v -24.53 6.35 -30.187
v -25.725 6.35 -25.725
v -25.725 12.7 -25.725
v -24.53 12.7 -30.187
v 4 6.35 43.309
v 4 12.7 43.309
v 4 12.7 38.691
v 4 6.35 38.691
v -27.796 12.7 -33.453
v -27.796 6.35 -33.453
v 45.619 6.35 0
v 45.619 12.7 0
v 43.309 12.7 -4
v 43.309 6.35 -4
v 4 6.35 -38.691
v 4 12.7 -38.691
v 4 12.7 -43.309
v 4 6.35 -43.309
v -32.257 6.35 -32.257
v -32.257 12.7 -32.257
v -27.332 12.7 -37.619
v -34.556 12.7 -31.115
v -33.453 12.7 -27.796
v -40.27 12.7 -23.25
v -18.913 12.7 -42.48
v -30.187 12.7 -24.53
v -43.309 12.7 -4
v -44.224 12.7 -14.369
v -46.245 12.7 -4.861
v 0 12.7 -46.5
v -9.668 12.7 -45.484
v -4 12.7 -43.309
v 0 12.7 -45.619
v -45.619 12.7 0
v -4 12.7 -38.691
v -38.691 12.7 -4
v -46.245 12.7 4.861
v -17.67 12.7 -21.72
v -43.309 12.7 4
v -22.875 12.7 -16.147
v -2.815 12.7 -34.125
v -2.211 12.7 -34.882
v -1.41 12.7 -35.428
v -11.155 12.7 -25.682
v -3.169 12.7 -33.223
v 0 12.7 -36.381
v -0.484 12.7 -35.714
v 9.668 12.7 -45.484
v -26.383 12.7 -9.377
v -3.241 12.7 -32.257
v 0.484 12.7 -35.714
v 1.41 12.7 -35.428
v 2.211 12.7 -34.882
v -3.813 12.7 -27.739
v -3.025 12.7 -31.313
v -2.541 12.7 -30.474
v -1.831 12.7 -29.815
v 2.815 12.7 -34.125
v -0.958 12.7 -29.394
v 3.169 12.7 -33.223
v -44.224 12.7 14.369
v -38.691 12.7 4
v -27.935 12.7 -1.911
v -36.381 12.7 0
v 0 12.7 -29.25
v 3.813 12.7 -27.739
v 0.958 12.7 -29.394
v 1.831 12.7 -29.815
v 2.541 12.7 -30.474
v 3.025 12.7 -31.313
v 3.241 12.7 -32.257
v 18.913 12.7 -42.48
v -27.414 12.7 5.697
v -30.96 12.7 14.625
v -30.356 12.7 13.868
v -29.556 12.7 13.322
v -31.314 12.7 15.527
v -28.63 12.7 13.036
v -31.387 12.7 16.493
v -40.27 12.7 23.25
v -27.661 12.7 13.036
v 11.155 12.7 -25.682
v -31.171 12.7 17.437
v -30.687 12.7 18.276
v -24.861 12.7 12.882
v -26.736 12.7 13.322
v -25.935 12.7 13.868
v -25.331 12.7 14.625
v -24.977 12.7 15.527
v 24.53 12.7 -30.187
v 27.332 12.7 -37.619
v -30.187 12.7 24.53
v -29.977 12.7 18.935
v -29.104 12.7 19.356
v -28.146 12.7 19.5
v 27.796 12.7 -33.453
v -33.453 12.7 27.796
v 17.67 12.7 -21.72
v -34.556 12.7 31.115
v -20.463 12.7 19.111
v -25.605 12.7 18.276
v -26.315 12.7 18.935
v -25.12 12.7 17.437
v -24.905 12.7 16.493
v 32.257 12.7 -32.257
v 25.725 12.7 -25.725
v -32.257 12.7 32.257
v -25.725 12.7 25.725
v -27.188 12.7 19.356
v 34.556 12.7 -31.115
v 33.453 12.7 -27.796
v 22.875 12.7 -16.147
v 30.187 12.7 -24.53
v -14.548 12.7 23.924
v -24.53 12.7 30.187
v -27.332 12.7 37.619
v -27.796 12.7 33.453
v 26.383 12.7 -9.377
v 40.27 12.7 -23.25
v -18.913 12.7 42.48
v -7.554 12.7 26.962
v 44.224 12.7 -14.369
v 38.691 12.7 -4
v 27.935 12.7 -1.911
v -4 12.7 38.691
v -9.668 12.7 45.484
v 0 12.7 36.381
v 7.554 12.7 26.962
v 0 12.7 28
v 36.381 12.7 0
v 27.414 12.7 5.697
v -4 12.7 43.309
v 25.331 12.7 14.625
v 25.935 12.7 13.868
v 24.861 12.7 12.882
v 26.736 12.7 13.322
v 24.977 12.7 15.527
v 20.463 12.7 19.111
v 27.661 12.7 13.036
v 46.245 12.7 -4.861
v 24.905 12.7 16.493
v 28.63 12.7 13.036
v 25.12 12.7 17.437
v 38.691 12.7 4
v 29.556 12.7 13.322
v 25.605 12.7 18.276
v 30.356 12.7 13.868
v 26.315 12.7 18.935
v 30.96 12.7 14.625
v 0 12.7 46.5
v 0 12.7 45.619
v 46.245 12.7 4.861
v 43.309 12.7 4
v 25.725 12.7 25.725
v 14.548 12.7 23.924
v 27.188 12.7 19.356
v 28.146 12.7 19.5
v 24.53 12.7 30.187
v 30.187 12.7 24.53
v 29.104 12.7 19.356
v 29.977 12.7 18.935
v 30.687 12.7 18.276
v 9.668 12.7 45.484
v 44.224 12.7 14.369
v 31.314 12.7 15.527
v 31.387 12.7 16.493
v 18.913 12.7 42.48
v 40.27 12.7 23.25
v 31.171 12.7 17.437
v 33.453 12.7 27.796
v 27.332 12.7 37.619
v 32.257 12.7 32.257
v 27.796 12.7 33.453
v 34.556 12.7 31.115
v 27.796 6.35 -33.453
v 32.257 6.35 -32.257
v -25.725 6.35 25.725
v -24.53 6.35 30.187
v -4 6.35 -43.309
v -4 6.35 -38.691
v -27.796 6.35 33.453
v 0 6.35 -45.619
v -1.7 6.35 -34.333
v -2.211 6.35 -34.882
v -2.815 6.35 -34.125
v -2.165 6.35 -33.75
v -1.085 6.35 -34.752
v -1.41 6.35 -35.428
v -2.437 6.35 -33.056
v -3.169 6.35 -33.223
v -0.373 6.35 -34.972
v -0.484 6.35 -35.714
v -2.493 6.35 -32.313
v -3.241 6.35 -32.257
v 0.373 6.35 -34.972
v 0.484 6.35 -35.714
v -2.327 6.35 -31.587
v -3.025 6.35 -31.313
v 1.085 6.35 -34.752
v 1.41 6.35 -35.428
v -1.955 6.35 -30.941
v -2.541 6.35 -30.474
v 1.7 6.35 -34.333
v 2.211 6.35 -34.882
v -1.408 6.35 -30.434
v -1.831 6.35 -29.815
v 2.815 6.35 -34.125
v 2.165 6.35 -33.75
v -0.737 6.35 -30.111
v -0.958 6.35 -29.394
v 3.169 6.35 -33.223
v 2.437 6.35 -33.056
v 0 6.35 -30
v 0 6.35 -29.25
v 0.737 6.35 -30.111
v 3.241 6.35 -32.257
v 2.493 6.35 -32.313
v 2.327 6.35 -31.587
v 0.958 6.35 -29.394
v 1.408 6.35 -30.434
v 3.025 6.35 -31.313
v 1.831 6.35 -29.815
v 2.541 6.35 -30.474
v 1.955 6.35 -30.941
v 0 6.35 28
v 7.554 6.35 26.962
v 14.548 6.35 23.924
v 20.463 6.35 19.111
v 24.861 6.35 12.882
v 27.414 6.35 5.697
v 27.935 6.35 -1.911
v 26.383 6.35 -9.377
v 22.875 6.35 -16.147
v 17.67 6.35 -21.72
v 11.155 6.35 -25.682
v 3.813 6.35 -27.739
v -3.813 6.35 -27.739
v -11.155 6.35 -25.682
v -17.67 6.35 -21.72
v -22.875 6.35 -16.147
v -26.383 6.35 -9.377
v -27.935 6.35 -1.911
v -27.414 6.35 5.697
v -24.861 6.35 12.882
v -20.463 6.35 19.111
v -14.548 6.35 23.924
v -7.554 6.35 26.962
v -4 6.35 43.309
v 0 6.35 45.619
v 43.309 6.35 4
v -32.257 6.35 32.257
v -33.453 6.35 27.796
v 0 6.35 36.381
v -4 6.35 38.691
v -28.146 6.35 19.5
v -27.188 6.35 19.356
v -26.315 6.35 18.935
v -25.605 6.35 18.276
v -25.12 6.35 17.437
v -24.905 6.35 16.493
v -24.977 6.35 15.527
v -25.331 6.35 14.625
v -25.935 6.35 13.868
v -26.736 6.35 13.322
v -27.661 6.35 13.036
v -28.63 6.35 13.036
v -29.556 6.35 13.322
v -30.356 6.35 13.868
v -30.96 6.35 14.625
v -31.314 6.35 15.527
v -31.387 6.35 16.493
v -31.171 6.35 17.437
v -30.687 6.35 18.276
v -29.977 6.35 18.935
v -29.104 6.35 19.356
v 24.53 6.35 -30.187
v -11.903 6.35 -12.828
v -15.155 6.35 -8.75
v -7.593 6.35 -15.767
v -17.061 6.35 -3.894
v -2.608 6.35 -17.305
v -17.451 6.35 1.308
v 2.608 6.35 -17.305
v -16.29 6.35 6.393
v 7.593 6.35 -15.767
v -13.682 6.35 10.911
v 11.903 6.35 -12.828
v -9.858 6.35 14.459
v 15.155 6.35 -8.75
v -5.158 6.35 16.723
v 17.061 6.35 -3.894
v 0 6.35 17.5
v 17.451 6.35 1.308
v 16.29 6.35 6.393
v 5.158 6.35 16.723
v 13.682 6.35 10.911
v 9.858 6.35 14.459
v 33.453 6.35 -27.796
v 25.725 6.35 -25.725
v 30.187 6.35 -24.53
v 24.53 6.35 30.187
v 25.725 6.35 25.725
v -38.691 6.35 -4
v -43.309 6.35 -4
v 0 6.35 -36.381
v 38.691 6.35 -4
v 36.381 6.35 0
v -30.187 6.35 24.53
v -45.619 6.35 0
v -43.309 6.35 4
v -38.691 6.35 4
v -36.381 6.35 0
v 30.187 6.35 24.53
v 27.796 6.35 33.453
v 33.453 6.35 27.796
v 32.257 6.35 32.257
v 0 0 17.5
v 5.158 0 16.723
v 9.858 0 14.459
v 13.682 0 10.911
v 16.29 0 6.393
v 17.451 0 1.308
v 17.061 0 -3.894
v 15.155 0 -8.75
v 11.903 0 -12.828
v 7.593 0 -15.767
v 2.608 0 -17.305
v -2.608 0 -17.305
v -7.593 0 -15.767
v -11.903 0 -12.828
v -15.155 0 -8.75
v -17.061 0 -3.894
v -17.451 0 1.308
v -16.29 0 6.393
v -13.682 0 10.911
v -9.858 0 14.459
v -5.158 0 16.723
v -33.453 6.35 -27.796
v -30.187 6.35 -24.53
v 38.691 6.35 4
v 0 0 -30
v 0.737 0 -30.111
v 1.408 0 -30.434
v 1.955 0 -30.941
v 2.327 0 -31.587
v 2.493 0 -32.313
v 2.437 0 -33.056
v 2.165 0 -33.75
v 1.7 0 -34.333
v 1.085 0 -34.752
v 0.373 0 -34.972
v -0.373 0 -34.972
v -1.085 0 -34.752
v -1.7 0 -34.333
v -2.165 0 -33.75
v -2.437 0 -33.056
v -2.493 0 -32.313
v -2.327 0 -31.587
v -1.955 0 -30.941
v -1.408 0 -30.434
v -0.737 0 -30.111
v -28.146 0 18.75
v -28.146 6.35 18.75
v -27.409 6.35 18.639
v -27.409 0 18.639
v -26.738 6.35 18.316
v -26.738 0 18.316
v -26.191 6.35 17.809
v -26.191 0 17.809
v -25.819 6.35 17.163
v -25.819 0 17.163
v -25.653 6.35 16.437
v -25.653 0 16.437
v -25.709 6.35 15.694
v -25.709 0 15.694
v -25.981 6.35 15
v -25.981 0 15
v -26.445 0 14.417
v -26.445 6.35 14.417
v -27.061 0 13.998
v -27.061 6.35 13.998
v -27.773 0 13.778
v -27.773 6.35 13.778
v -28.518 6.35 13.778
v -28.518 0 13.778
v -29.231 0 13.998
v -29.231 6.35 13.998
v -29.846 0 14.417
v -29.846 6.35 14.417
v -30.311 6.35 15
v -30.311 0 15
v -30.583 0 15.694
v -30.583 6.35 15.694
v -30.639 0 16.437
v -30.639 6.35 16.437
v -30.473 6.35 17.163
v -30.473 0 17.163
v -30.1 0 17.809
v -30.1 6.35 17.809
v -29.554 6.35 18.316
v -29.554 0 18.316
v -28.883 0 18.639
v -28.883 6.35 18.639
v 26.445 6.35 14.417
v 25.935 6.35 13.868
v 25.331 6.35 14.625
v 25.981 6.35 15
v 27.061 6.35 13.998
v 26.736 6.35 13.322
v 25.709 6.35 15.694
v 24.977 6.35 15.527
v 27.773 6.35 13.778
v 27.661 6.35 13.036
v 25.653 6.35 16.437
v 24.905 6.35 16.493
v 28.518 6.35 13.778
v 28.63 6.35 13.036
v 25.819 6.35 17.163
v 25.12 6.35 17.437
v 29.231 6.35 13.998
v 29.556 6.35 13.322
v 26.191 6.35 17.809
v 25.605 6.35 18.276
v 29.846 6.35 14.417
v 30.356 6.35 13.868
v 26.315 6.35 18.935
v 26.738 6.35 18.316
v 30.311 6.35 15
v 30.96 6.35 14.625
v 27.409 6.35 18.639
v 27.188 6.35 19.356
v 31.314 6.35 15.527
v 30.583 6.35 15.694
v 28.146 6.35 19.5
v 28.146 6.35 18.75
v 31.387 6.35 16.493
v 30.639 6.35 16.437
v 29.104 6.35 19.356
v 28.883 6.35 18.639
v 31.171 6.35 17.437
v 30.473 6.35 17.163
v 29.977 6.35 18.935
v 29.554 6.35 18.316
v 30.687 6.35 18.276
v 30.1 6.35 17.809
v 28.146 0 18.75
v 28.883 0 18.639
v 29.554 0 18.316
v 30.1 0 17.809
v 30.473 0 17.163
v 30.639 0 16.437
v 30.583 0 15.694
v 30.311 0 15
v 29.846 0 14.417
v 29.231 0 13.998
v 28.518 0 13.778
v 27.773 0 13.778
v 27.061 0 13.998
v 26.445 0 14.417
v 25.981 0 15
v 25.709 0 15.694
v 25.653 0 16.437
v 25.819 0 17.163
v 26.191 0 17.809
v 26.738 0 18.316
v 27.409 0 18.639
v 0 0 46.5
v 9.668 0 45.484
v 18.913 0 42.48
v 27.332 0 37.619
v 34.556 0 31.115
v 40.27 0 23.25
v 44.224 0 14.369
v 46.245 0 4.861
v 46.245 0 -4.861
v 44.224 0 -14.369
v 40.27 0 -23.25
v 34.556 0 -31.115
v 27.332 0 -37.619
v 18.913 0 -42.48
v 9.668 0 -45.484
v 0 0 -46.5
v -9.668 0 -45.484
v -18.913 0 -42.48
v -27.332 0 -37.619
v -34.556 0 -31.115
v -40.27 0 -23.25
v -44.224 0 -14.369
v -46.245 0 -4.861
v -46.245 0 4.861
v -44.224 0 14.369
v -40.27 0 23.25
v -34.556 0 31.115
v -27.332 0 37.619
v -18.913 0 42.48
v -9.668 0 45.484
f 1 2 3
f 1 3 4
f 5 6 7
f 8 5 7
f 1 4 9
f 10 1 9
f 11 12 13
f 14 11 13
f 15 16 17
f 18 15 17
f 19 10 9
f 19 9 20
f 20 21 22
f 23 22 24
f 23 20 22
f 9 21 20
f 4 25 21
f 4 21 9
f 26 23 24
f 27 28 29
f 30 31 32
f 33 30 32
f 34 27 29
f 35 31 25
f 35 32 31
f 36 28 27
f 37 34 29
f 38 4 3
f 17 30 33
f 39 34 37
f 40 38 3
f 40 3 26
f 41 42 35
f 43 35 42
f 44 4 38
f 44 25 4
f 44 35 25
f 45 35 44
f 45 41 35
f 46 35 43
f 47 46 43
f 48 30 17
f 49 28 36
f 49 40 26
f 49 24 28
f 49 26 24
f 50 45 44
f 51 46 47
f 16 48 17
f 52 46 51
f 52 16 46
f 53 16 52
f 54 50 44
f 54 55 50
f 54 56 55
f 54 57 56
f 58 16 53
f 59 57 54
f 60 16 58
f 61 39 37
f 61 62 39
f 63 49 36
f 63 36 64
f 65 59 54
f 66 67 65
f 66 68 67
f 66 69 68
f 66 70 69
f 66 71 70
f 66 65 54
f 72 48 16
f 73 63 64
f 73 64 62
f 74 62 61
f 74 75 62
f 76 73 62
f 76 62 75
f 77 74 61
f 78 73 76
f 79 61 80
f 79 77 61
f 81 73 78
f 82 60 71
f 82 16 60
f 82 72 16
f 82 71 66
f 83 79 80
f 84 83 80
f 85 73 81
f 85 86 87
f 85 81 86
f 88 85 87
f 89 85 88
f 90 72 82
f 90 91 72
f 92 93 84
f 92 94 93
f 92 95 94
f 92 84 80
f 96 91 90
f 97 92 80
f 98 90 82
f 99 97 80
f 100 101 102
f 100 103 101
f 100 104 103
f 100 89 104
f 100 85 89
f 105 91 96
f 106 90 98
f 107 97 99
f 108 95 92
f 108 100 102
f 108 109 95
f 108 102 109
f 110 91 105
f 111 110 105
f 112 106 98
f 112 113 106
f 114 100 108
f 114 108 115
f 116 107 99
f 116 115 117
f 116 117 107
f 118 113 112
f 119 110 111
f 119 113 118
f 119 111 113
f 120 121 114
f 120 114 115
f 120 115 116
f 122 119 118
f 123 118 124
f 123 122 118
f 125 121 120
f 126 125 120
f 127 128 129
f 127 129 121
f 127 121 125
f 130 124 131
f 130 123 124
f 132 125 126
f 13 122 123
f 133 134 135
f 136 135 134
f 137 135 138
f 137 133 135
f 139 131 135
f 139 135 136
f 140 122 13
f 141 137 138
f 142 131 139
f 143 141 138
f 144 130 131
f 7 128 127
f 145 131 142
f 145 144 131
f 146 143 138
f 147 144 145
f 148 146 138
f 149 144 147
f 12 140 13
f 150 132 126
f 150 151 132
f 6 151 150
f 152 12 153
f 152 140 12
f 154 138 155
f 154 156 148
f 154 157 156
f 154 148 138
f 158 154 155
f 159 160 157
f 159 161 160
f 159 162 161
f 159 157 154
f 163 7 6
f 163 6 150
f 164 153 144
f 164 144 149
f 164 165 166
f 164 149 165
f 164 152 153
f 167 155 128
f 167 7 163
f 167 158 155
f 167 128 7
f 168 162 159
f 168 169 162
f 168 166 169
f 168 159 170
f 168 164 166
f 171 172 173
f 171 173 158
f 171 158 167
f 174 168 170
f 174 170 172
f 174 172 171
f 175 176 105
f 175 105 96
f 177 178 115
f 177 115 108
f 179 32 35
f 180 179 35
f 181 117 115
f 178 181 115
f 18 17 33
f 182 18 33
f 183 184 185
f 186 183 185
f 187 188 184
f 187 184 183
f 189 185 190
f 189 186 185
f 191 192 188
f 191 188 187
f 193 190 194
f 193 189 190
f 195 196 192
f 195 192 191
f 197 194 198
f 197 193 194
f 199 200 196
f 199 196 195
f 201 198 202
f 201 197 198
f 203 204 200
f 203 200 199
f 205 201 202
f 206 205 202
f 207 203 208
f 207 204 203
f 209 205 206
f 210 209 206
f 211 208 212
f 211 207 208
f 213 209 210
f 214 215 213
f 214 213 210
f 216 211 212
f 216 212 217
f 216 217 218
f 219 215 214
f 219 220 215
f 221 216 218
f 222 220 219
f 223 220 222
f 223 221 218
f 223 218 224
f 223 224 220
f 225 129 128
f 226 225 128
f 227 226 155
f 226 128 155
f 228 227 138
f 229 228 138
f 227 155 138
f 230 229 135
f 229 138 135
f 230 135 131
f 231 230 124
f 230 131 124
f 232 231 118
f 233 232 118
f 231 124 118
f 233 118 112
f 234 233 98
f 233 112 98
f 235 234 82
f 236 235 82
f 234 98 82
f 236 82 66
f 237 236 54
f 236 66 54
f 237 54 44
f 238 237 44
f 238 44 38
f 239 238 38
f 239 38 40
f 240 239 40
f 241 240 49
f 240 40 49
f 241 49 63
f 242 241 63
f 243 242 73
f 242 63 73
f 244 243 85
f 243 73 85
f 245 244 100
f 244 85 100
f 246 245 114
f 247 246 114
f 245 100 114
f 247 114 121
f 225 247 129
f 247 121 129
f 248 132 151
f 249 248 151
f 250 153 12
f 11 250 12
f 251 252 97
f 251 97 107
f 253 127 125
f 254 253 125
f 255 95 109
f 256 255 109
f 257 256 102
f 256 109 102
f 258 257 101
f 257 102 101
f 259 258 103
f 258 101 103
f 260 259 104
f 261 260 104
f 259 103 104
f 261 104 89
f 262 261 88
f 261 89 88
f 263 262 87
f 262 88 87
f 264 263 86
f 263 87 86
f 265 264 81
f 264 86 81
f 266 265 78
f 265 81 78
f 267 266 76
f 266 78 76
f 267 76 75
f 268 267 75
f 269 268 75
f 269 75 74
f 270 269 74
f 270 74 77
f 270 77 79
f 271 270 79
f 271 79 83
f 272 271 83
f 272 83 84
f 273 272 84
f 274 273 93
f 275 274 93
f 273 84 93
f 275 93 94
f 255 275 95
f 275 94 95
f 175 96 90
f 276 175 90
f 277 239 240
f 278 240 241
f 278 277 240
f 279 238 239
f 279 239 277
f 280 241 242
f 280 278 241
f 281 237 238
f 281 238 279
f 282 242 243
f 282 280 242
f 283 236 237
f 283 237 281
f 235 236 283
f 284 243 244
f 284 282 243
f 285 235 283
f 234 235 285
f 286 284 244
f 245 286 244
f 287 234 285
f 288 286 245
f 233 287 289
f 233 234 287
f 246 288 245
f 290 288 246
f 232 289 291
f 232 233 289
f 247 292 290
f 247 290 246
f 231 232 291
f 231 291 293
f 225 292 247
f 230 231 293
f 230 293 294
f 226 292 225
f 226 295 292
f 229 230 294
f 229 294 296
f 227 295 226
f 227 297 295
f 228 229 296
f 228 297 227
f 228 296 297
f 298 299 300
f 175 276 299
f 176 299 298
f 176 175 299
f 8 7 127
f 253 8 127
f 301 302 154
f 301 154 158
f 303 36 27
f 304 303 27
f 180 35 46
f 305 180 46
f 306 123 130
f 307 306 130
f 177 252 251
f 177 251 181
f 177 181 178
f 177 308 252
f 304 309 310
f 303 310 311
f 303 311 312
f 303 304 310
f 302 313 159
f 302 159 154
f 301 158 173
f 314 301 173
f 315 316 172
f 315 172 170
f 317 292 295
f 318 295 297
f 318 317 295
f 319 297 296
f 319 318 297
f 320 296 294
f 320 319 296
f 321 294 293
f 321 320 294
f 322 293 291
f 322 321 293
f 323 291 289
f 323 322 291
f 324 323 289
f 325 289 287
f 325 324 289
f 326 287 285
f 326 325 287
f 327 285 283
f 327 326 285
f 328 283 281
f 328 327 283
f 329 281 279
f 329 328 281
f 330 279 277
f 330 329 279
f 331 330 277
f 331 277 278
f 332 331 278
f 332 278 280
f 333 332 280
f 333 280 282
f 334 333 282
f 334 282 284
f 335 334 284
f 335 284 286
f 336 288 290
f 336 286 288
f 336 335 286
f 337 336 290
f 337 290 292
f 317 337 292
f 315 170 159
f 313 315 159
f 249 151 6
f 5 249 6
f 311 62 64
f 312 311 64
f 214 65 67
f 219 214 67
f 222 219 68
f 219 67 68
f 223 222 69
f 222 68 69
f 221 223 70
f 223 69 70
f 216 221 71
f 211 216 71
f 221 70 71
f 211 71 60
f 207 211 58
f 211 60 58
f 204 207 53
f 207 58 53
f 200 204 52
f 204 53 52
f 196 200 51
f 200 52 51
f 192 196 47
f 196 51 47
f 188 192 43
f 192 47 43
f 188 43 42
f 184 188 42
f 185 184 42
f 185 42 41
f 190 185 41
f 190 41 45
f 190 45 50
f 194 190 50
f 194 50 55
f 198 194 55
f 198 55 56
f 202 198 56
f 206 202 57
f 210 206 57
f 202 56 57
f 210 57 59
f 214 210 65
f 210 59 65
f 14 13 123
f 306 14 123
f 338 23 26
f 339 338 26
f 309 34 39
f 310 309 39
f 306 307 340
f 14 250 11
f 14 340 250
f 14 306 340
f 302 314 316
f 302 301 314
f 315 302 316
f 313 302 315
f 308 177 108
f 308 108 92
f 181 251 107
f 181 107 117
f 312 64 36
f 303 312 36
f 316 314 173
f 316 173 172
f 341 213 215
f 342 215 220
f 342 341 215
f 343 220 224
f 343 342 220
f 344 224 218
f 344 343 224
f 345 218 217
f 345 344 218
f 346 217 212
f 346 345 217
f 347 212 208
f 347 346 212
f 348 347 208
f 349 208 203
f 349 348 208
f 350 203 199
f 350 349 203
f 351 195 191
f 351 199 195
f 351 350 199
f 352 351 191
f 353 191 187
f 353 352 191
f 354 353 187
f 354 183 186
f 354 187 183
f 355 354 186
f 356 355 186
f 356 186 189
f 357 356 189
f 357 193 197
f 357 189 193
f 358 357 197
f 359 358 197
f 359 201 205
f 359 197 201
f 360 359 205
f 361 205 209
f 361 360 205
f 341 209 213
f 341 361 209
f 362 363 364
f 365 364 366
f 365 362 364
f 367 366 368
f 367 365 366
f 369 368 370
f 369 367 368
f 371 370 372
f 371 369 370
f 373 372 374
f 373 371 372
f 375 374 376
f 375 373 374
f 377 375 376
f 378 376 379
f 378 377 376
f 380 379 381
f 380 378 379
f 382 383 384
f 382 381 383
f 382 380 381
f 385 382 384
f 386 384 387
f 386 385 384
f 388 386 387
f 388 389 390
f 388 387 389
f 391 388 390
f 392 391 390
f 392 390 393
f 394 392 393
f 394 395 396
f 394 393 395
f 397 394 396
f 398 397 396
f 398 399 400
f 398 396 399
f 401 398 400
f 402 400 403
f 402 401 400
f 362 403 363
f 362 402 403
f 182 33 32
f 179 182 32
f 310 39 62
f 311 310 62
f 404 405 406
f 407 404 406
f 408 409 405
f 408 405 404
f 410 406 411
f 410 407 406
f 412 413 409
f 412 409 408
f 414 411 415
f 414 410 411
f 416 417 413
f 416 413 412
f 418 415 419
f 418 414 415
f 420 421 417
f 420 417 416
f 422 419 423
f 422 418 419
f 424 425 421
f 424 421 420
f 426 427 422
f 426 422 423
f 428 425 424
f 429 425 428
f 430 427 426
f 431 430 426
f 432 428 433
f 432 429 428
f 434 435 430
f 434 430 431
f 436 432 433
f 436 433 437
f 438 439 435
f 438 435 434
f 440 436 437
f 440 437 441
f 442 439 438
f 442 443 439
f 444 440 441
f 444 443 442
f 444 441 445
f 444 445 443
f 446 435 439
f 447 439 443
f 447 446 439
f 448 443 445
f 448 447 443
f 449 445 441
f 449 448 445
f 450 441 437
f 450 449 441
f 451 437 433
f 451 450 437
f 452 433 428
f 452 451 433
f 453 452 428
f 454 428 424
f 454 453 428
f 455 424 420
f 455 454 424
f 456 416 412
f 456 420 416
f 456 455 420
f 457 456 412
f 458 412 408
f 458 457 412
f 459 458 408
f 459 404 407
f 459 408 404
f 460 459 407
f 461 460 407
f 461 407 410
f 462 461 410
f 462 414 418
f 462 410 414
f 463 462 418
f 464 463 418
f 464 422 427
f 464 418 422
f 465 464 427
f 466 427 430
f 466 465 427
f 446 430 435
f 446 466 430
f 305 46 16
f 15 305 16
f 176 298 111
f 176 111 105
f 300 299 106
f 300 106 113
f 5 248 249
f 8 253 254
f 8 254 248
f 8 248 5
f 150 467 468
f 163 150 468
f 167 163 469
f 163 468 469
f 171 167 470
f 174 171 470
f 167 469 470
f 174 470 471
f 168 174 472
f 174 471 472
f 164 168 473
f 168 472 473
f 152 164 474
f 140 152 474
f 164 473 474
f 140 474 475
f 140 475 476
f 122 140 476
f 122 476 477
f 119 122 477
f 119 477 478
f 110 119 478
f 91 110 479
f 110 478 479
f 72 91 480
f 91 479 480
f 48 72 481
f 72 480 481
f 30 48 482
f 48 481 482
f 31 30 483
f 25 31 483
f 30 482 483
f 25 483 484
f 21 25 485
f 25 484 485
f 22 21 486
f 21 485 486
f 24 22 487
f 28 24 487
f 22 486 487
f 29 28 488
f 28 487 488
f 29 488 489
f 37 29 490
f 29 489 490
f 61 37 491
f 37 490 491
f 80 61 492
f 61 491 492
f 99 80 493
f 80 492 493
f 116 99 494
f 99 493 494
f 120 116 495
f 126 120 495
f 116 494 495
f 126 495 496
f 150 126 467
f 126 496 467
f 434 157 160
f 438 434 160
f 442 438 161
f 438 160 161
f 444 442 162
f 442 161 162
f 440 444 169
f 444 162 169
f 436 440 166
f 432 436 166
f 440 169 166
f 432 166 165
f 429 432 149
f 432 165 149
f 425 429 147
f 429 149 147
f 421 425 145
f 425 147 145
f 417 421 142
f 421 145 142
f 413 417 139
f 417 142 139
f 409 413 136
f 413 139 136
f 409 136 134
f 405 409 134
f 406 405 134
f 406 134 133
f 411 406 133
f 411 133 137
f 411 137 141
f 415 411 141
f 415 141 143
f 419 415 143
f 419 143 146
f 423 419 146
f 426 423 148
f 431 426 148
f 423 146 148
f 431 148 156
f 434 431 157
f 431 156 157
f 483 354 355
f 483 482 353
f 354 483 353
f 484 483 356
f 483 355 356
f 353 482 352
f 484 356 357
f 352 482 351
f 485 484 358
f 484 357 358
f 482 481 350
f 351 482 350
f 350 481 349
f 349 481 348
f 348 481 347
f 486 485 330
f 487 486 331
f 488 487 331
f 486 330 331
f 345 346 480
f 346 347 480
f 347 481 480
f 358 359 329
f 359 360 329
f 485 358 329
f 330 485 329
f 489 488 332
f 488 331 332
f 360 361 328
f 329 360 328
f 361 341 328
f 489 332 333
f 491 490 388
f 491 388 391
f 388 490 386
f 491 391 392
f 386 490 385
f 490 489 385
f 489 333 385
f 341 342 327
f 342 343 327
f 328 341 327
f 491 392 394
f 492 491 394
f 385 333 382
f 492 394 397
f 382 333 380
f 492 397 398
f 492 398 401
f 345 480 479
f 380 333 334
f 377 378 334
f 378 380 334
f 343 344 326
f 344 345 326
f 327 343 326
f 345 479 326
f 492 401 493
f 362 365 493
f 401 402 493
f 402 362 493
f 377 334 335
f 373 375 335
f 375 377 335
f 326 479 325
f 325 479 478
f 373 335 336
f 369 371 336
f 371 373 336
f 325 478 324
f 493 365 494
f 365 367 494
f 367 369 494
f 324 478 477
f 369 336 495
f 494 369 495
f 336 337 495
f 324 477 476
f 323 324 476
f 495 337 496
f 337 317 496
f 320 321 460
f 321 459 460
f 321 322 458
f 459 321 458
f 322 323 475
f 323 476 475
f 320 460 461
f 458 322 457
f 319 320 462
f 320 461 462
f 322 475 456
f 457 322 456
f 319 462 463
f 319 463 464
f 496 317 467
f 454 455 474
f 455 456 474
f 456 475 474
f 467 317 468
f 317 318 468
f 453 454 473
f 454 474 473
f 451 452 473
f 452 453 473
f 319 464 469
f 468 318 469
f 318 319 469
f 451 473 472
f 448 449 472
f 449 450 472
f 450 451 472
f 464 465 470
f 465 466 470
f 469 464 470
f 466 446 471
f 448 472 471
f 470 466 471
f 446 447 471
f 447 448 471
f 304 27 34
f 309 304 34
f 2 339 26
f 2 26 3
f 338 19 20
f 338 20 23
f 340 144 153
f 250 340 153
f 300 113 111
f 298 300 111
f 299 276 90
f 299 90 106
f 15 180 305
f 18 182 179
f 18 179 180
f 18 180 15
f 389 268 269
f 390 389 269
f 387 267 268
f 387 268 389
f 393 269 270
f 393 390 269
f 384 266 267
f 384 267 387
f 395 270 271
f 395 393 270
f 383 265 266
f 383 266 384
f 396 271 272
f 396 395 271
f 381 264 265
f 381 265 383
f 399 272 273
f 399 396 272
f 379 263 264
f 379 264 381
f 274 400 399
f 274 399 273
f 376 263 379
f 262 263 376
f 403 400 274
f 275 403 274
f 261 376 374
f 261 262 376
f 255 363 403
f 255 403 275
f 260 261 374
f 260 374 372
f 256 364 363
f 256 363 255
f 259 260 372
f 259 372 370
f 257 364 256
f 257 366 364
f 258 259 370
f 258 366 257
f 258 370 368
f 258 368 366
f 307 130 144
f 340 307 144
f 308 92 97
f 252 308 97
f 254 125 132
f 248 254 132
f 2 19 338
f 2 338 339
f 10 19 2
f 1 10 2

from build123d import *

# Parameters (mm, degrees)
SKETCH1_R           = 46.5
SKETCH1_R_2         = 2.5
SKETCH1_R_3         = 17.5
BOSS_EXTRUDE1_DEPTH = 12.7
SKETCH2_R           = 28
CUT_EXTRUDE1_DEPTH  = 6.35
SKETCH3_R           = 2.5
CUT_EXTRUDE2_DEPTH  = 6.35
SKETCH4_R           = 3.25
CUT_EXTRUDE3_DEPTH  = 6.35


with BuildPart() as part:
    # Sketch1 → Boss-Extrude1 (new body)
    with BuildSketch(Plane(origin=(0, 0, 0), x_dir=(1, 0, 0), z_dir=(0, 1, 0))):
        with Locations(Location((0, 0, 0), (0, 0, 270))):
            Circle(SKETCH1_R)
        with Locations(Location((0, 32.5, 0), (0, 0, 270))):
            Circle(SKETCH1_R_2, mode=Mode.SUBTRACT)
        with Locations(Location((28.145825623, -16.25, 0), (0, 0, 270))):
            Circle(SKETCH1_R_2, mode=Mode.SUBTRACT)
        with Locations(Location((-28.145825623, -16.25, 0), (0, 0, 270))):
            Circle(SKETCH1_R_2, mode=Mode.SUBTRACT)
        with Locations(Location((0, 0, 0), (0, 0, 270))):
            Circle(SKETCH1_R_3, mode=Mode.SUBTRACT)
    extrude(amount=BOSS_EXTRUDE1_DEPTH)

    # Sketch2 → Cut-Extrude1 (cut)
    with BuildSketch(Plane(origin=(0, 12.7, 0), x_dir=(1, 0, 0), z_dir=(0, 1, 0))):
        with Locations(Location((0, 0, 0), (0, 0, 270))):
            Circle(SKETCH2_R)
    extrude(amount=-CUT_EXTRUDE1_DEPTH, mode=Mode.SUBTRACT)

    # Sketch3 → Cut-Extrude2 (cut)
    with BuildSketch(Plane(origin=(0, 12.7, 0), x_dir=(1, 0, 0), z_dir=(0, 1, 0))):
        with Locations(Location((0, 41, 0), (0, 0, 270))):
            Circle(SKETCH3_R)
        with Locations(Location((28.991378029, 28.991378029, 0), (0, 0, 270))):
            Circle(SKETCH3_R)
        with Locations(Location((41, 0, 0), (0, 0, 270))):
            Circle(SKETCH3_R)
        with Locations(Location((28.991378029, -28.991378029, 0), (0, 0, 270))):
            Circle(SKETCH3_R)
        with Locations(Location((0, -41, 0), (0, 0, 270))):
            Circle(SKETCH3_R)
        with Locations(Location((-28.991378029, -28.991378029, 0), (0, 0, 270))):
            Circle(SKETCH3_R)
        with Locations(Location((-41, 0, 0), (0, 0, 270))):
            Circle(SKETCH3_R)
        with Locations(Location((-28.991378029, 28.991378029, 0), (0, 0, 270))):
            Circle(SKETCH3_R)
    extrude(amount=-CUT_EXTRUDE2_DEPTH, mode=Mode.SUBTRACT)

    # Sketch4 → Cut-Extrude3 (cut)
    with BuildSketch(Plane(origin=(0, 12.7, 0), x_dir=(1, 0, 0), z_dir=(0, 1, 0))):
        with Locations(Location((0, 32.5, 0), (0, 0, 270))):
            Circle(SKETCH4_R)
        with Locations(Location((28.145825623, -16.25, 0), (0, 0, 270))):
            Circle(SKETCH4_R)
        with Locations(Location((-28.145825623, -16.25, 0), (0, 0, 270))):
            Circle(SKETCH4_R)
        Polygon((0, 45.618802154), (-4, 43.309401077), (-4, 38.690598923), (0, 36.381197846), (4, 38.690598923), (4, 43.309401077), align=None)
        Polygon((33.452798315, 27.795944066), (32.257364352, 32.257364352), (27.795944066, 33.452798315), (24.529957742, 30.186811992), (25.725391705, 25.725391705), (30.186811992, 24.529957742), align=None)
        Polygon((43.309401077, -4), (45.618802154, 0), (43.309401077, 4), (38.690598923, 4), (36.381197846, 0), (38.690598923, -4), align=None)
        Polygon((27.795944066, -33.452798315), (32.257364352, -32.257364352), (33.452798315, -27.795944066), (30.186811992, -24.529957742), (25.725391705, -25.725391705), (24.529957742, -30.186811992), align=None)
        Polygon((-4, -43.309401077), (0, -45.618802154), (4, -43.309401077), (4, -38.690598923), (0, -36.381197846), (-4, -38.690598923), align=None)
        Polygon((-33.452798315, -27.795944066), (-32.257364352, -32.257364352), (-27.795944066, -33.452798315), (-24.529957742, -30.186811992), (-25.725391705, -25.725391705), (-30.186811992, -24.529957742), align=None)
        Polygon((-43.309401077, 4), (-45.618802154, 0), (-43.309401077, -4), (-38.690598923, -4), (-36.381197846, 0), (-38.690598923, 4), align=None)
        Polygon((-27.795944066, 33.452798315), (-32.257364352, 32.257364352), (-33.452798315, 27.795944066), (-30.186811992, 24.529957742), (-25.725391705, 25.725391705), (-24.529957742, 30.186811992), align=None)
    extrude(amount=-CUT_EXTRUDE3_DEPTH, mode=Mode.SUBTRACT)


solid = part.part
